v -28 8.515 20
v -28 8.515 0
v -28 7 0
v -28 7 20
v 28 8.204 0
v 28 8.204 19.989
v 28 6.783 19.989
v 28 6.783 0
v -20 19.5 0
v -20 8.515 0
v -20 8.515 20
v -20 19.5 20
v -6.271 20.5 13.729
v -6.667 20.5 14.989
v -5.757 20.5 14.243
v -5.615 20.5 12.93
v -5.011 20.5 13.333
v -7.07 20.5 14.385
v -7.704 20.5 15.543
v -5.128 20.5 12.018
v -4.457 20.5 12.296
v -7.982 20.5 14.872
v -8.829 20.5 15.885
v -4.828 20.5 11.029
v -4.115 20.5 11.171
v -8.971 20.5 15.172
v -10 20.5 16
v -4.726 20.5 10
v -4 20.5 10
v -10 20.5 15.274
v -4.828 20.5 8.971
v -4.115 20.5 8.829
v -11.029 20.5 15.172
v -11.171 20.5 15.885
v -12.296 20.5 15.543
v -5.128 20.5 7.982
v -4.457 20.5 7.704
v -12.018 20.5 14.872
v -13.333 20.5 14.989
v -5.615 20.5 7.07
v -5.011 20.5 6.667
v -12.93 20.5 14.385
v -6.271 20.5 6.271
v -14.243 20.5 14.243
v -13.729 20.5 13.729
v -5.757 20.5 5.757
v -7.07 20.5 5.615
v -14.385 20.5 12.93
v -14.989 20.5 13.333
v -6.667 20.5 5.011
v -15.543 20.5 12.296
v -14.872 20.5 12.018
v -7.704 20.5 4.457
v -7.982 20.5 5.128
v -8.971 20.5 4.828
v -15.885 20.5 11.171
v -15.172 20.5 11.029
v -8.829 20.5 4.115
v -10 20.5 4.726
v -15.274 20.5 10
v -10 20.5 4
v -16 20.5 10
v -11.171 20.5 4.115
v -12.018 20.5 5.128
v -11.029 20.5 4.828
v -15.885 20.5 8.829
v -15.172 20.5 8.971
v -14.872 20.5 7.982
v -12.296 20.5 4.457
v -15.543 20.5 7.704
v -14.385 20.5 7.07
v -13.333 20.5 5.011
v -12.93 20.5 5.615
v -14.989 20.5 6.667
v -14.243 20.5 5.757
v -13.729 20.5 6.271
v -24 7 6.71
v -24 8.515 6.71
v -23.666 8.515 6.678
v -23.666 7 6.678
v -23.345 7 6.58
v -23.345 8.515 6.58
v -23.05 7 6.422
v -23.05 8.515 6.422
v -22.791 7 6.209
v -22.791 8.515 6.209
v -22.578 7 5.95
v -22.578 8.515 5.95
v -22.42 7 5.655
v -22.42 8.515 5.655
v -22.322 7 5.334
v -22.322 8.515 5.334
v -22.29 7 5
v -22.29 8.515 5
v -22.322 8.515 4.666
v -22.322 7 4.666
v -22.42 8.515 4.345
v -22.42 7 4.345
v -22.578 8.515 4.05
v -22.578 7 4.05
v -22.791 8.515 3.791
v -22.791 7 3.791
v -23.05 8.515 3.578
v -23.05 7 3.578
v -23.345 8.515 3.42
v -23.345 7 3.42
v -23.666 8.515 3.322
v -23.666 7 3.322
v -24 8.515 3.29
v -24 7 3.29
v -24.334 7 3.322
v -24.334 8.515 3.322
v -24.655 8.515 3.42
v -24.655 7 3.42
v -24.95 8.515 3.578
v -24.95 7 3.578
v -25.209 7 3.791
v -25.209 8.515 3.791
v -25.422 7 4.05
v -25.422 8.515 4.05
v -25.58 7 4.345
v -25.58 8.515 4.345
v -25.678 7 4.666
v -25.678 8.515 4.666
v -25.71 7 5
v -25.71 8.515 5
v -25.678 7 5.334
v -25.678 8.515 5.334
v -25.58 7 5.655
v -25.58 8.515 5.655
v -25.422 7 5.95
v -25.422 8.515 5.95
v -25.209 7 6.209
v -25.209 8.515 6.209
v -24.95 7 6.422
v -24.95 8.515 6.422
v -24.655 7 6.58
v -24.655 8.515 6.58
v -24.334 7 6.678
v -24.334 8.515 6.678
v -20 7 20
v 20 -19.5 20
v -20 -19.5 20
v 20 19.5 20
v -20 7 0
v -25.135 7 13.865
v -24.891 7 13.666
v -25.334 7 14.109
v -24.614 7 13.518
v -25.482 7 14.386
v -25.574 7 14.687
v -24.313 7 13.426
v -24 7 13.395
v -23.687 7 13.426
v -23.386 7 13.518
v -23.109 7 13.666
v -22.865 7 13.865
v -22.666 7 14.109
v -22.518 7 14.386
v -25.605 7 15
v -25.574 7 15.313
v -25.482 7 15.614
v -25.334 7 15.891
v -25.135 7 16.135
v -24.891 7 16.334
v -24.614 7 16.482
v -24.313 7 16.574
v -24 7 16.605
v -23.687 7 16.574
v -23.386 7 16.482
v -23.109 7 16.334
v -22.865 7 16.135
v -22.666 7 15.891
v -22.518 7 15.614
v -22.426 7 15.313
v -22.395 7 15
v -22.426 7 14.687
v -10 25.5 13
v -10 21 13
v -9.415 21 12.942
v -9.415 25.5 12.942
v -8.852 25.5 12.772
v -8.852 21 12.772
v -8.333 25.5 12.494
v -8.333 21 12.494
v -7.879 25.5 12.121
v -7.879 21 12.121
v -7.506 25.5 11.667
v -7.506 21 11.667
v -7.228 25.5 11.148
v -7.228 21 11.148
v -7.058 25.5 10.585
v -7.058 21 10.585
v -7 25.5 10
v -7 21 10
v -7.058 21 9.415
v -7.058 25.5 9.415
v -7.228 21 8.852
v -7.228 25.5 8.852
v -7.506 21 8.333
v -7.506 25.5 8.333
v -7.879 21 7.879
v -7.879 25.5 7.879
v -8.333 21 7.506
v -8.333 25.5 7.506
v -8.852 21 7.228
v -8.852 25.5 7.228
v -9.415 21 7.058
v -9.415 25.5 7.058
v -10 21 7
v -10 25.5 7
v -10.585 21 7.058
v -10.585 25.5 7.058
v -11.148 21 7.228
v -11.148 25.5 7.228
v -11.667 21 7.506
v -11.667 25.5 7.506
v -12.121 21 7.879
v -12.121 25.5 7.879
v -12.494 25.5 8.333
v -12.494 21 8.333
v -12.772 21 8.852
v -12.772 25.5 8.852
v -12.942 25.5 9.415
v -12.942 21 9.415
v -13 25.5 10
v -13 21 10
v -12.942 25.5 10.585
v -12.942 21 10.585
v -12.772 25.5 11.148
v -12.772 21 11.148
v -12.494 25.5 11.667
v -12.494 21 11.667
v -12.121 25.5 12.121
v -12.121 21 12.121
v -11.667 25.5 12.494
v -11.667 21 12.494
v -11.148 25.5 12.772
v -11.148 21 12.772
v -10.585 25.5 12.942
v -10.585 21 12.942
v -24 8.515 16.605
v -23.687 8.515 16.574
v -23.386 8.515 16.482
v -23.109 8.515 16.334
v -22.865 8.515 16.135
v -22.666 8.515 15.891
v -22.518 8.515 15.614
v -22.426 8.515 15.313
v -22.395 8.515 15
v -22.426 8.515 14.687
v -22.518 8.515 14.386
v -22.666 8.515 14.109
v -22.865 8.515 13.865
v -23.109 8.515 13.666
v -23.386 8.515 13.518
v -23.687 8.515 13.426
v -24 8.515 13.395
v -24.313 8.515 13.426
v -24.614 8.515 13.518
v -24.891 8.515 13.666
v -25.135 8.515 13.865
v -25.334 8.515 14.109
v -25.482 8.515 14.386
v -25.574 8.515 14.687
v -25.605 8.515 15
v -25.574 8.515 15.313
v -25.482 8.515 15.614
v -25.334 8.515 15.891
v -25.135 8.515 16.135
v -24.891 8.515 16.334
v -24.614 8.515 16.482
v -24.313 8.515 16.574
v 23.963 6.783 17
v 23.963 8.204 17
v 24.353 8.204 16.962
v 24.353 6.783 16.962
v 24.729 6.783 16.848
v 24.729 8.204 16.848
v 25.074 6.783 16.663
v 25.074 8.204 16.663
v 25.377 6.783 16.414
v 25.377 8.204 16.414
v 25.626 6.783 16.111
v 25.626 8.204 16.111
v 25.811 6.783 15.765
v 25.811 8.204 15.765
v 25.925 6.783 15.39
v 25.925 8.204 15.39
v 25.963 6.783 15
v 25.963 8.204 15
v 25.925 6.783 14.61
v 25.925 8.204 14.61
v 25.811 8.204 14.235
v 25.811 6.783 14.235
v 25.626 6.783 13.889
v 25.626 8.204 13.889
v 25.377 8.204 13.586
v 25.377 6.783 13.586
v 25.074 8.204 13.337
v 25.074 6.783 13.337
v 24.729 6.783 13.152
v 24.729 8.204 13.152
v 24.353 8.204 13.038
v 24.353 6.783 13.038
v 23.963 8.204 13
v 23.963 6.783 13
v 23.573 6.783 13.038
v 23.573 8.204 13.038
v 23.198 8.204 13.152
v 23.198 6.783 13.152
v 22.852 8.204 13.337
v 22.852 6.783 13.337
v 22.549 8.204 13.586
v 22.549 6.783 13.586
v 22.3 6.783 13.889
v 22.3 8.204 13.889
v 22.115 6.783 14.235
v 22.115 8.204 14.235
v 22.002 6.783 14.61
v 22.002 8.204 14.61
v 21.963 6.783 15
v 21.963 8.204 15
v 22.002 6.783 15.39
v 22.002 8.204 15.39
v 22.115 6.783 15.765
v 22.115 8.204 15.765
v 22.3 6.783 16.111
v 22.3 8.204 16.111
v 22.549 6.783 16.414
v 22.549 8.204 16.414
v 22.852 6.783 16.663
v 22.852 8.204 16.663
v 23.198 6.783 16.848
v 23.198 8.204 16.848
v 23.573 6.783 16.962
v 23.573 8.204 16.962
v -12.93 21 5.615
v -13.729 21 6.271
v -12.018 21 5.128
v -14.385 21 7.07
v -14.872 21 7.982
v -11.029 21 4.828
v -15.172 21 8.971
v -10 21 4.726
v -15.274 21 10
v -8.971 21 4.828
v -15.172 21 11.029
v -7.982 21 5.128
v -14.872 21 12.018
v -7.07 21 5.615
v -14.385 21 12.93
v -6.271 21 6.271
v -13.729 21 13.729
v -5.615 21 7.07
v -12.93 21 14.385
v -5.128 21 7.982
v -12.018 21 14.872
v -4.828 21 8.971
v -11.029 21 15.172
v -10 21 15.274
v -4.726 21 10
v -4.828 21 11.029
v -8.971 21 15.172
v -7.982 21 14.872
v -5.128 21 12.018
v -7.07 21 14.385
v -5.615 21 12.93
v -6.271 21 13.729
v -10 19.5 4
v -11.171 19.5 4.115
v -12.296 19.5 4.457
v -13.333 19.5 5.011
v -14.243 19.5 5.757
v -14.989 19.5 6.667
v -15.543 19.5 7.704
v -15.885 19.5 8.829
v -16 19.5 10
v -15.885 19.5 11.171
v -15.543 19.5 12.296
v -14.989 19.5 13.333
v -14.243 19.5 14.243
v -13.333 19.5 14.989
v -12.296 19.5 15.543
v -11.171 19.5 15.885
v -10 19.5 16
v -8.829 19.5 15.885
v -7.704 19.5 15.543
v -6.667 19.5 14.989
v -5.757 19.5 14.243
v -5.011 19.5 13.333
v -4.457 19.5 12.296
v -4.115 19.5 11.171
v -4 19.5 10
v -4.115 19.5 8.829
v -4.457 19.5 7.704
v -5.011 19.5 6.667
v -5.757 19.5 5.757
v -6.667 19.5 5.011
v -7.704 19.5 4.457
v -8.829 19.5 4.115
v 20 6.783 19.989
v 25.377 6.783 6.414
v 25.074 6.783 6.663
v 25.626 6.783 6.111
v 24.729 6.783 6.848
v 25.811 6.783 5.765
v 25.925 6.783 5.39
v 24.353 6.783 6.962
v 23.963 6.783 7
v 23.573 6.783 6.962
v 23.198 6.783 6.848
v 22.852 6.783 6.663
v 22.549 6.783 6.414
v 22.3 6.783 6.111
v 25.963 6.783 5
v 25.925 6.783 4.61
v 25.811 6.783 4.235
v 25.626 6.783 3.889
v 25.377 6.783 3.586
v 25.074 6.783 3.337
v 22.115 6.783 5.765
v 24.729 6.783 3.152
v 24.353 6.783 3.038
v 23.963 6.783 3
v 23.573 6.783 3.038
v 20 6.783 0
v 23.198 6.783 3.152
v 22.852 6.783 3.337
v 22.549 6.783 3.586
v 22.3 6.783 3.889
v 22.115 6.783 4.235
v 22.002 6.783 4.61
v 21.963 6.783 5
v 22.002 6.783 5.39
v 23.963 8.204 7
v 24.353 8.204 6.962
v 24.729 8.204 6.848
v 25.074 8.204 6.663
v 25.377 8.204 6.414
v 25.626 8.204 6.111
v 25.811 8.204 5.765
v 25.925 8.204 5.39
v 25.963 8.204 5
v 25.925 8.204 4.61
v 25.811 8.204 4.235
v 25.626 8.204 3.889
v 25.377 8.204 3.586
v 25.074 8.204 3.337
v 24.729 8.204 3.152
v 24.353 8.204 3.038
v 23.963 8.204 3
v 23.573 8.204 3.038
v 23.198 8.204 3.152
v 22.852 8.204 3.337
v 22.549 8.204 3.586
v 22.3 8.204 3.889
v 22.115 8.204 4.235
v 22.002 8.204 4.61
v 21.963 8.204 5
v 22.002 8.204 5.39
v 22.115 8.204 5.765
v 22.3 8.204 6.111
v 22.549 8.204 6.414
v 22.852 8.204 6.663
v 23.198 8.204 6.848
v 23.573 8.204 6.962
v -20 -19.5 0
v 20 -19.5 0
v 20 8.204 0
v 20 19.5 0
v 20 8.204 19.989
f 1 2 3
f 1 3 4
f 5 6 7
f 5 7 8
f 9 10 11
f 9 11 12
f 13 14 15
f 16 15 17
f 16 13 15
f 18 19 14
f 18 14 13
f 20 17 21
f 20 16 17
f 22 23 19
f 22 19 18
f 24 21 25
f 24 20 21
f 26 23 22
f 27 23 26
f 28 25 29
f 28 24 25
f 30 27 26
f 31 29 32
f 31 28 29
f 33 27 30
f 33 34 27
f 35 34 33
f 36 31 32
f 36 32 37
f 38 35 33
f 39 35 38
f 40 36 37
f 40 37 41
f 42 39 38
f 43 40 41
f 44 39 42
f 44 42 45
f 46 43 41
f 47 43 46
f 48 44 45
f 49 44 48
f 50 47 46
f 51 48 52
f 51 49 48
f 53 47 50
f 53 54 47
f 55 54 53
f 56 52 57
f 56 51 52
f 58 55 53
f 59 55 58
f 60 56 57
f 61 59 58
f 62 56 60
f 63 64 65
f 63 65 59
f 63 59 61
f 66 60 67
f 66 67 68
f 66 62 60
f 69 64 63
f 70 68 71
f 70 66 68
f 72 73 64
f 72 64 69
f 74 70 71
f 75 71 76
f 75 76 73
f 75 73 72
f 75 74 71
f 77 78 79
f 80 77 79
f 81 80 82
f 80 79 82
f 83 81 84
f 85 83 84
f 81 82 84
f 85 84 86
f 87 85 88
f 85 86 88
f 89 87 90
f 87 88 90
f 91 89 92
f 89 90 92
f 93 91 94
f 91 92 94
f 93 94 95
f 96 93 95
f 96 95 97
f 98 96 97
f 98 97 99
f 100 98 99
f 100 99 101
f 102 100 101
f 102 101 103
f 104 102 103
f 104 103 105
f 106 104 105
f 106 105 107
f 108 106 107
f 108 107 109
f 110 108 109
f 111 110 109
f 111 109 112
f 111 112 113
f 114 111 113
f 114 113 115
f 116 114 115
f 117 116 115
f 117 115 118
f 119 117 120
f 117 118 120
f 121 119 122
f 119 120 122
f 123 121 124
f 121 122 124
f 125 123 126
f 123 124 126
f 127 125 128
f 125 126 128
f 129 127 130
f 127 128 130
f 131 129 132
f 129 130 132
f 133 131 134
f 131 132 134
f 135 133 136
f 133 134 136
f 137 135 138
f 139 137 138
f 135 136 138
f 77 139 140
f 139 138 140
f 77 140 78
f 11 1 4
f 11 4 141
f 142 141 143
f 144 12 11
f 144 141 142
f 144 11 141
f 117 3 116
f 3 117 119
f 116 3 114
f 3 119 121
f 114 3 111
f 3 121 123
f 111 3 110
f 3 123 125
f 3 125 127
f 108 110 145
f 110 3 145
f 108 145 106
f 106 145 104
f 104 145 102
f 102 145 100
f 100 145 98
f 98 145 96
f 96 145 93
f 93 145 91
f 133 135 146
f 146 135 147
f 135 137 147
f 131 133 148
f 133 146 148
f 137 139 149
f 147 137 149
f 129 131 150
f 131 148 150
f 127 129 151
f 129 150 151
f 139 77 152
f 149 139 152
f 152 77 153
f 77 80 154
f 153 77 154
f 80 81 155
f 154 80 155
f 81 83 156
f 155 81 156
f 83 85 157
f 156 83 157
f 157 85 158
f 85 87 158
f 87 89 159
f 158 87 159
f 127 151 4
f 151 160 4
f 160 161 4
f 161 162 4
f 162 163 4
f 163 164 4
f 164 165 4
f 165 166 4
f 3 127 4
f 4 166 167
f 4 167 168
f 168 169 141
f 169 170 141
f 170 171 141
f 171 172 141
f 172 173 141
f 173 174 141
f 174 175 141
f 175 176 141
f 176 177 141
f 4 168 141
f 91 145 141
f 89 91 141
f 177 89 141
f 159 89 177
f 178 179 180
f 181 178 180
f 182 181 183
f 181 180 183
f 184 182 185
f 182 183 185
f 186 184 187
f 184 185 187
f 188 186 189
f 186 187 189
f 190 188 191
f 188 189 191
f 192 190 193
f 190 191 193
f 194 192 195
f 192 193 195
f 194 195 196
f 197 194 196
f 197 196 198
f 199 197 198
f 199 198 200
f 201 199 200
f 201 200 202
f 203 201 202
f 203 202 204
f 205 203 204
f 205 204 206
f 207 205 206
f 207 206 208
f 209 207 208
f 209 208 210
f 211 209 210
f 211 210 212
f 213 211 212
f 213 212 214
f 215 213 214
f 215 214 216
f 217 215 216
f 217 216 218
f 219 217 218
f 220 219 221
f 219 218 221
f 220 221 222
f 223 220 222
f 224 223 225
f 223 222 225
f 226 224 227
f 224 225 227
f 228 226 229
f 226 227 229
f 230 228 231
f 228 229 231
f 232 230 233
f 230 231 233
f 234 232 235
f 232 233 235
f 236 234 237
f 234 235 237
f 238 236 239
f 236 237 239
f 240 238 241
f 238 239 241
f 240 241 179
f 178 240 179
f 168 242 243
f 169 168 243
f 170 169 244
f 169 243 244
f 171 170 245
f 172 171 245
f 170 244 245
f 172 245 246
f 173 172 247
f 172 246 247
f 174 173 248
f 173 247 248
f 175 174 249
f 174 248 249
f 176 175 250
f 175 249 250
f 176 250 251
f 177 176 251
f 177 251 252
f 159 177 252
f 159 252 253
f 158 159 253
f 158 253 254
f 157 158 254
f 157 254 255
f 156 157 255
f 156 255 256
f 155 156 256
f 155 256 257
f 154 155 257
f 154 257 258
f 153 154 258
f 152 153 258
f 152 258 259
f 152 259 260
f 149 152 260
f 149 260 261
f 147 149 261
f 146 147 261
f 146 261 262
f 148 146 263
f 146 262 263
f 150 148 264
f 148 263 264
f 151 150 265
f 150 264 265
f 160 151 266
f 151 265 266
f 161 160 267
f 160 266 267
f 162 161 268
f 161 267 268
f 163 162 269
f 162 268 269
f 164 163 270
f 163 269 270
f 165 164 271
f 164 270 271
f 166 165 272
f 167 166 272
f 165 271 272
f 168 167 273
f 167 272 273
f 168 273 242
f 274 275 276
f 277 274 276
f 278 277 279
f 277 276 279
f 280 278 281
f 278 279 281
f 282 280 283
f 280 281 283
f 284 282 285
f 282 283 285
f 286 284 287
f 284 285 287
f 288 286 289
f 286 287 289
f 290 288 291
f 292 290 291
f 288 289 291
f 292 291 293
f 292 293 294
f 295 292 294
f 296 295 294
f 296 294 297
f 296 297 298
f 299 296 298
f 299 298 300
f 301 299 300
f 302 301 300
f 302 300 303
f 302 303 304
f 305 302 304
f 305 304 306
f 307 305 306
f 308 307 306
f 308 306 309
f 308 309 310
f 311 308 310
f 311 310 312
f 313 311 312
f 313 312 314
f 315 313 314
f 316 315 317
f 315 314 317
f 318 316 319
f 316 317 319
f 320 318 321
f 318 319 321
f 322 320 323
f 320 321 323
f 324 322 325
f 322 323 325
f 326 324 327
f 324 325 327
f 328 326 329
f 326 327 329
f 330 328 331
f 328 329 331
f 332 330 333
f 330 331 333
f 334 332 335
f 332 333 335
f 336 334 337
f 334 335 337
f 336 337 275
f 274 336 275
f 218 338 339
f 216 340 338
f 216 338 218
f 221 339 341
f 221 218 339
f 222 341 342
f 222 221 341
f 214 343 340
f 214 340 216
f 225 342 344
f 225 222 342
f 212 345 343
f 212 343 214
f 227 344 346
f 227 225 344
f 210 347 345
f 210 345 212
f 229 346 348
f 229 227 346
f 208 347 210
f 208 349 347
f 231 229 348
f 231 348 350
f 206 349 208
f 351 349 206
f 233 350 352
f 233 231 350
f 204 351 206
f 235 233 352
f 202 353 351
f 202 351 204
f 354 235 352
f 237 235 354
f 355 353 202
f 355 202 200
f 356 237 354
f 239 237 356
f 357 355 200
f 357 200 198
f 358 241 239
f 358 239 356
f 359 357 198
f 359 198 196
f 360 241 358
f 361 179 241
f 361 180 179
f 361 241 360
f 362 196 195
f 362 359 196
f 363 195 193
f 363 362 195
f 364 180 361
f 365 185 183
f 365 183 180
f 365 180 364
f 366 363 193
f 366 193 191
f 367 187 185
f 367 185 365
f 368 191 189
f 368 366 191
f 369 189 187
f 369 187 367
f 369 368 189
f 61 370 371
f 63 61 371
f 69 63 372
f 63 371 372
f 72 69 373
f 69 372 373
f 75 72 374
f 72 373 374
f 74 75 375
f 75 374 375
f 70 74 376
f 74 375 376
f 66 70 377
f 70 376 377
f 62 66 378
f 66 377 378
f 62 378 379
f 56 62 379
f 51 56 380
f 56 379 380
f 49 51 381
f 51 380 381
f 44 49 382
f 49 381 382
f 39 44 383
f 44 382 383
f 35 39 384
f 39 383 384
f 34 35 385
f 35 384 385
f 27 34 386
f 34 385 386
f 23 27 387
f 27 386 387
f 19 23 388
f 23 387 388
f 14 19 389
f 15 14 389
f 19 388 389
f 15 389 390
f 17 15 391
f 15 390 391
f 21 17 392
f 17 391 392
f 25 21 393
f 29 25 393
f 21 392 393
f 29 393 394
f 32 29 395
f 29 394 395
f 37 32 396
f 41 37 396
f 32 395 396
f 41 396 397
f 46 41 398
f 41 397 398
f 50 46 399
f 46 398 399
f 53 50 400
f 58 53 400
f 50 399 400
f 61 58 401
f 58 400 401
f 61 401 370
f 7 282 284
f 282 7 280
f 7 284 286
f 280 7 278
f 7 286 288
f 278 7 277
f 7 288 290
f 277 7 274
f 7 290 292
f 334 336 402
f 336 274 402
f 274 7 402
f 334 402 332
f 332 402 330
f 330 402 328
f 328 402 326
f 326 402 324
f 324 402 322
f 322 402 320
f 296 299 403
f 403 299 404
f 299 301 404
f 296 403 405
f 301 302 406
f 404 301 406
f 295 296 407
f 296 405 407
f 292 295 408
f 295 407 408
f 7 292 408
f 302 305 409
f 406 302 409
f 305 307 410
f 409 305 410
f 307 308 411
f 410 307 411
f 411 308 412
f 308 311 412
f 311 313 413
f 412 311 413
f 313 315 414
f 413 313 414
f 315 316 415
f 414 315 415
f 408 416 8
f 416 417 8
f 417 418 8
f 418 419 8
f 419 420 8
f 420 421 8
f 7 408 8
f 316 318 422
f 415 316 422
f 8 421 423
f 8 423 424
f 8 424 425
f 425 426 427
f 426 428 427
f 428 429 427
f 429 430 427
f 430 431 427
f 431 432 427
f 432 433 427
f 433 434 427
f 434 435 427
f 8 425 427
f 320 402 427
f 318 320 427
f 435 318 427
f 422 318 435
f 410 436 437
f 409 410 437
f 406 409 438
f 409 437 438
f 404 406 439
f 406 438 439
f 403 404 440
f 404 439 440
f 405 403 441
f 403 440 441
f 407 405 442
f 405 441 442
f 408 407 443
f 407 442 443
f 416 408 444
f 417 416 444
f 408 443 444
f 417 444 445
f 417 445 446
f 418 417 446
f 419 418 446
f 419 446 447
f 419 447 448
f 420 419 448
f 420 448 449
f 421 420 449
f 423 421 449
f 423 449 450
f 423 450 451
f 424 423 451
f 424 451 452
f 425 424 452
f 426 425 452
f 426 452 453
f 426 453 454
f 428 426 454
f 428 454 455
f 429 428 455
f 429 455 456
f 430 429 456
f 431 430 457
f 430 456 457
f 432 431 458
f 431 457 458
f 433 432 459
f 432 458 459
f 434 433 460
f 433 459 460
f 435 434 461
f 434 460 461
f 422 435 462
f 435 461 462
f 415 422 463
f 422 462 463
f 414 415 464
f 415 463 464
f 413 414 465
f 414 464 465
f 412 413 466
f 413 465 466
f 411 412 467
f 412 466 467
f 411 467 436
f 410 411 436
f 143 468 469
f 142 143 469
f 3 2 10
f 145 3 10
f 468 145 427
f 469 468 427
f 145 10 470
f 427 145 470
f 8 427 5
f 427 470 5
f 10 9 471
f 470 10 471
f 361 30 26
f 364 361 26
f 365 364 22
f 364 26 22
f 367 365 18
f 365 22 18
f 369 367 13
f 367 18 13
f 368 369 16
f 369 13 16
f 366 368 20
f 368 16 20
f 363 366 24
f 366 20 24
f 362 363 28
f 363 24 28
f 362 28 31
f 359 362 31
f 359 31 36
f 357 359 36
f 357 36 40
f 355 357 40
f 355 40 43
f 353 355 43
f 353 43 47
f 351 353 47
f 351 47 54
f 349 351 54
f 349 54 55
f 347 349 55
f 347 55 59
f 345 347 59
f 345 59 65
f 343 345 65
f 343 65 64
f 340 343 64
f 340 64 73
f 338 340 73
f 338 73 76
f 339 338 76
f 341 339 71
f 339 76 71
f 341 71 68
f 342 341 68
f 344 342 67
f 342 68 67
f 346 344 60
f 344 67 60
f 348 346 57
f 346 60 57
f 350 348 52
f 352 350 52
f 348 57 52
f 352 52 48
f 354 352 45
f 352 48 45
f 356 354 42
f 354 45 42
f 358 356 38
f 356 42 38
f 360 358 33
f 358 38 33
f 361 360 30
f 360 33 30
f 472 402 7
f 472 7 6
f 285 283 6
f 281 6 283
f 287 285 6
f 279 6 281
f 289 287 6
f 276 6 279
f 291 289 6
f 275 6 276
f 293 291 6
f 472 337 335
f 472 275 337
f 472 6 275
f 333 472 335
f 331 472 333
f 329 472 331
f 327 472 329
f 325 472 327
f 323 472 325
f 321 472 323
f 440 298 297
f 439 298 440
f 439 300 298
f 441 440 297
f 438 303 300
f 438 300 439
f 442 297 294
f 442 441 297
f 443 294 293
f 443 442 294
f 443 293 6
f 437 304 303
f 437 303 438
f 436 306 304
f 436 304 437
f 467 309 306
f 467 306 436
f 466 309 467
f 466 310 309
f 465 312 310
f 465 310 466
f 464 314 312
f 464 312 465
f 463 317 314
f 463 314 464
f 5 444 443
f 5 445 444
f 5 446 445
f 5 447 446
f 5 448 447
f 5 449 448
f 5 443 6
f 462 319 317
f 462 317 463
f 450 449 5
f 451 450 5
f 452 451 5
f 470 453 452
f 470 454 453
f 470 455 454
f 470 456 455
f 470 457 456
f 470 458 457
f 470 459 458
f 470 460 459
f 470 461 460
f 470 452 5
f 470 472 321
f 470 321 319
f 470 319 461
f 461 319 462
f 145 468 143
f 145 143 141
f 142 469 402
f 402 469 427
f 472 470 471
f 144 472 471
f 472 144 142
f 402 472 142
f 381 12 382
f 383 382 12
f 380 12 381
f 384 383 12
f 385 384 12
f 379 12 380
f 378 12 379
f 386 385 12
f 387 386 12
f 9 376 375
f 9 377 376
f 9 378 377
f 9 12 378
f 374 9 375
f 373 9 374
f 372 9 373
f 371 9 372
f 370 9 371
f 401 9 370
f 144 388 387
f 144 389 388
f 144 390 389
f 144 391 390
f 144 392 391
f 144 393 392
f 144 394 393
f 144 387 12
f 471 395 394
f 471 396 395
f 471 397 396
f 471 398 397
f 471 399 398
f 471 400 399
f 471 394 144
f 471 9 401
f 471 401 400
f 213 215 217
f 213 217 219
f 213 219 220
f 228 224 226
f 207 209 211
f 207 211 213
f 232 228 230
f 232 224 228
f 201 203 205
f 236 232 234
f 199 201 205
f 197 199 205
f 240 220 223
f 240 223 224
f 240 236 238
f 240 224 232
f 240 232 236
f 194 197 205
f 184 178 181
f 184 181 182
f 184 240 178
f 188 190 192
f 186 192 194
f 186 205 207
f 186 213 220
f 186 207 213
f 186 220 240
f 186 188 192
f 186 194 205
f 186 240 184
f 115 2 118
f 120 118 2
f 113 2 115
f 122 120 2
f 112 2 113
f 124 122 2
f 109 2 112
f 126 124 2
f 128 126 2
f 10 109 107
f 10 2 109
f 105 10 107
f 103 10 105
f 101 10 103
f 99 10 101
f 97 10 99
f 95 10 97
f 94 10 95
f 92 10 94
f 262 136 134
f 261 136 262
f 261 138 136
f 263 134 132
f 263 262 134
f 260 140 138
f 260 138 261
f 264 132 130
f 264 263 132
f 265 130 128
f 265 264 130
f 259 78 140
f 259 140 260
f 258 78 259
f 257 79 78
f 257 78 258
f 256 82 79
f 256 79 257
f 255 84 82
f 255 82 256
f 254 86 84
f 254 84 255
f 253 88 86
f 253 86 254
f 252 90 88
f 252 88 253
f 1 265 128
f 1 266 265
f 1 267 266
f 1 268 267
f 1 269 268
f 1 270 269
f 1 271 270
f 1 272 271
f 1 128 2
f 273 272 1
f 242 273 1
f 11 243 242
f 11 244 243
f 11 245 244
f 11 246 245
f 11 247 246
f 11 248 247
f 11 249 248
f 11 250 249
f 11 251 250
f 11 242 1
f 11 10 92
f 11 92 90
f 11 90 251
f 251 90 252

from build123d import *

# Parameters (mm, degrees)
SKETCH_1_W          = 40
SKETCH_1_H          = 39
EXTRUDE_1_DEPTH     = 20
SKETCH_3_R          = 6
EXTRUDE_2_DEPTH     = 1
SKETCH_4_R          = 3
EXTRUDE_4_DEPTH     = 25.5
SKETCH_5_W          = 20
SKETCH_5_H          = 1.515151515
EXTRUDE_5_DEPTH     = 8
SKETCH_6_W          = 19.988535735
SKETCH_6_H          = 1.420485619
EXTRUDE_8_DEPTH     = 8
SKETCH_7_R          = 1.710468594
SKETCH_7_R_2        = 1.604618823
SKETCH_7_R_3        = 2
CUT_EXTRUDE_2_DEPTH = 3
SKETCH_9_R          = 5.273794996
EXTRUDE_9_DEPTH     = 1.5


with BuildPart() as part:
    # 草图1 → 凸台-拉伸1 (new body)
    with BuildSketch(Plane.XY):
        Rectangle(SKETCH_1_W, SKETCH_1_H)
    extrude(amount=EXTRUDE_1_DEPTH)

    # 草图3 → 凸台-拉伸2 (add)
    with BuildSketch(Plane(origin=(0, 19.5, 0), x_dir=(1, 0, 0), z_dir=(0, 1, 0))):
        with Locations(Location((-10, -10, 0), (0, 0, 90))):
            Circle(SKETCH_3_R)
    extrude(amount=EXTRUDE_2_DEPTH)

    # 草图4 → 凸台-拉伸4 (add)
    with BuildSketch(Plane(origin=(0, 0, 0), x_dir=(1, 0, 0), z_dir=(0, 1, 0))):
        with Locations(Location((-10, -10, 0), (0, 0, 270))):
            Circle(SKETCH_4_R)
    extrude(amount=EXTRUDE_4_DEPTH)

    # 草图5 → 凸台-拉伸5 (add)
    with BuildSketch(Plane.ZY.offset(20)):
        with Locations((10, 7.757575758)):
            Rectangle(SKETCH_5_W, SKETCH_5_H)
    extrude(amount=EXTRUDE_5_DEPTH)

    # 草图6 → 凸台-拉伸8 (add)
    with BuildSketch(Plane(origin=(20, 0, 0), x_dir=(0, 0, -1), z_dir=(1, 0, 0))):
        with Locations((-9.994267868, 7.493661874)):
            Rectangle(SKETCH_6_W, SKETCH_6_H)
    extrude(amount=EXTRUDE_8_DEPTH)

    # 草图7 → 切除-拉伸2 (cut)
    with BuildSketch(Plane(origin=(0, 8.515151515, 0), x_dir=(1, 0, 0), z_dir=(0, 1, 0))):
        with Locations(Location((-24, -5, 0), (0, 0, 270))):
            Circle(SKETCH_7_R)
        with Locations(Location((-24, -15, 0), (0, 0, 270))):
            Circle(SKETCH_7_R_2)
        with Locations(Location((23.963224728, -5, 0), (0, 0, 270))):
            Circle(SKETCH_7_R_3)
        with Locations(Location((23.963224728, -15, 0), (0, 0, 270))):
            Circle(SKETCH_7_R_3)
    extrude(amount=-CUT_EXTRUDE_2_DEPTH, mode=Mode.SUBTRACT)

    # 草图9 → 凸台-拉伸9 (add)
    with BuildSketch(Plane(origin=(0, 19.5, 0), x_dir=(1, 0, 0), z_dir=(0, 1, 0))):
        with Locations(Location((-10, -10, 0), (0, 0, 270))):
            Circle(SKETCH_9_R)
    extrude(amount=EXTRUDE_9_DEPTH)


solid = part.part
